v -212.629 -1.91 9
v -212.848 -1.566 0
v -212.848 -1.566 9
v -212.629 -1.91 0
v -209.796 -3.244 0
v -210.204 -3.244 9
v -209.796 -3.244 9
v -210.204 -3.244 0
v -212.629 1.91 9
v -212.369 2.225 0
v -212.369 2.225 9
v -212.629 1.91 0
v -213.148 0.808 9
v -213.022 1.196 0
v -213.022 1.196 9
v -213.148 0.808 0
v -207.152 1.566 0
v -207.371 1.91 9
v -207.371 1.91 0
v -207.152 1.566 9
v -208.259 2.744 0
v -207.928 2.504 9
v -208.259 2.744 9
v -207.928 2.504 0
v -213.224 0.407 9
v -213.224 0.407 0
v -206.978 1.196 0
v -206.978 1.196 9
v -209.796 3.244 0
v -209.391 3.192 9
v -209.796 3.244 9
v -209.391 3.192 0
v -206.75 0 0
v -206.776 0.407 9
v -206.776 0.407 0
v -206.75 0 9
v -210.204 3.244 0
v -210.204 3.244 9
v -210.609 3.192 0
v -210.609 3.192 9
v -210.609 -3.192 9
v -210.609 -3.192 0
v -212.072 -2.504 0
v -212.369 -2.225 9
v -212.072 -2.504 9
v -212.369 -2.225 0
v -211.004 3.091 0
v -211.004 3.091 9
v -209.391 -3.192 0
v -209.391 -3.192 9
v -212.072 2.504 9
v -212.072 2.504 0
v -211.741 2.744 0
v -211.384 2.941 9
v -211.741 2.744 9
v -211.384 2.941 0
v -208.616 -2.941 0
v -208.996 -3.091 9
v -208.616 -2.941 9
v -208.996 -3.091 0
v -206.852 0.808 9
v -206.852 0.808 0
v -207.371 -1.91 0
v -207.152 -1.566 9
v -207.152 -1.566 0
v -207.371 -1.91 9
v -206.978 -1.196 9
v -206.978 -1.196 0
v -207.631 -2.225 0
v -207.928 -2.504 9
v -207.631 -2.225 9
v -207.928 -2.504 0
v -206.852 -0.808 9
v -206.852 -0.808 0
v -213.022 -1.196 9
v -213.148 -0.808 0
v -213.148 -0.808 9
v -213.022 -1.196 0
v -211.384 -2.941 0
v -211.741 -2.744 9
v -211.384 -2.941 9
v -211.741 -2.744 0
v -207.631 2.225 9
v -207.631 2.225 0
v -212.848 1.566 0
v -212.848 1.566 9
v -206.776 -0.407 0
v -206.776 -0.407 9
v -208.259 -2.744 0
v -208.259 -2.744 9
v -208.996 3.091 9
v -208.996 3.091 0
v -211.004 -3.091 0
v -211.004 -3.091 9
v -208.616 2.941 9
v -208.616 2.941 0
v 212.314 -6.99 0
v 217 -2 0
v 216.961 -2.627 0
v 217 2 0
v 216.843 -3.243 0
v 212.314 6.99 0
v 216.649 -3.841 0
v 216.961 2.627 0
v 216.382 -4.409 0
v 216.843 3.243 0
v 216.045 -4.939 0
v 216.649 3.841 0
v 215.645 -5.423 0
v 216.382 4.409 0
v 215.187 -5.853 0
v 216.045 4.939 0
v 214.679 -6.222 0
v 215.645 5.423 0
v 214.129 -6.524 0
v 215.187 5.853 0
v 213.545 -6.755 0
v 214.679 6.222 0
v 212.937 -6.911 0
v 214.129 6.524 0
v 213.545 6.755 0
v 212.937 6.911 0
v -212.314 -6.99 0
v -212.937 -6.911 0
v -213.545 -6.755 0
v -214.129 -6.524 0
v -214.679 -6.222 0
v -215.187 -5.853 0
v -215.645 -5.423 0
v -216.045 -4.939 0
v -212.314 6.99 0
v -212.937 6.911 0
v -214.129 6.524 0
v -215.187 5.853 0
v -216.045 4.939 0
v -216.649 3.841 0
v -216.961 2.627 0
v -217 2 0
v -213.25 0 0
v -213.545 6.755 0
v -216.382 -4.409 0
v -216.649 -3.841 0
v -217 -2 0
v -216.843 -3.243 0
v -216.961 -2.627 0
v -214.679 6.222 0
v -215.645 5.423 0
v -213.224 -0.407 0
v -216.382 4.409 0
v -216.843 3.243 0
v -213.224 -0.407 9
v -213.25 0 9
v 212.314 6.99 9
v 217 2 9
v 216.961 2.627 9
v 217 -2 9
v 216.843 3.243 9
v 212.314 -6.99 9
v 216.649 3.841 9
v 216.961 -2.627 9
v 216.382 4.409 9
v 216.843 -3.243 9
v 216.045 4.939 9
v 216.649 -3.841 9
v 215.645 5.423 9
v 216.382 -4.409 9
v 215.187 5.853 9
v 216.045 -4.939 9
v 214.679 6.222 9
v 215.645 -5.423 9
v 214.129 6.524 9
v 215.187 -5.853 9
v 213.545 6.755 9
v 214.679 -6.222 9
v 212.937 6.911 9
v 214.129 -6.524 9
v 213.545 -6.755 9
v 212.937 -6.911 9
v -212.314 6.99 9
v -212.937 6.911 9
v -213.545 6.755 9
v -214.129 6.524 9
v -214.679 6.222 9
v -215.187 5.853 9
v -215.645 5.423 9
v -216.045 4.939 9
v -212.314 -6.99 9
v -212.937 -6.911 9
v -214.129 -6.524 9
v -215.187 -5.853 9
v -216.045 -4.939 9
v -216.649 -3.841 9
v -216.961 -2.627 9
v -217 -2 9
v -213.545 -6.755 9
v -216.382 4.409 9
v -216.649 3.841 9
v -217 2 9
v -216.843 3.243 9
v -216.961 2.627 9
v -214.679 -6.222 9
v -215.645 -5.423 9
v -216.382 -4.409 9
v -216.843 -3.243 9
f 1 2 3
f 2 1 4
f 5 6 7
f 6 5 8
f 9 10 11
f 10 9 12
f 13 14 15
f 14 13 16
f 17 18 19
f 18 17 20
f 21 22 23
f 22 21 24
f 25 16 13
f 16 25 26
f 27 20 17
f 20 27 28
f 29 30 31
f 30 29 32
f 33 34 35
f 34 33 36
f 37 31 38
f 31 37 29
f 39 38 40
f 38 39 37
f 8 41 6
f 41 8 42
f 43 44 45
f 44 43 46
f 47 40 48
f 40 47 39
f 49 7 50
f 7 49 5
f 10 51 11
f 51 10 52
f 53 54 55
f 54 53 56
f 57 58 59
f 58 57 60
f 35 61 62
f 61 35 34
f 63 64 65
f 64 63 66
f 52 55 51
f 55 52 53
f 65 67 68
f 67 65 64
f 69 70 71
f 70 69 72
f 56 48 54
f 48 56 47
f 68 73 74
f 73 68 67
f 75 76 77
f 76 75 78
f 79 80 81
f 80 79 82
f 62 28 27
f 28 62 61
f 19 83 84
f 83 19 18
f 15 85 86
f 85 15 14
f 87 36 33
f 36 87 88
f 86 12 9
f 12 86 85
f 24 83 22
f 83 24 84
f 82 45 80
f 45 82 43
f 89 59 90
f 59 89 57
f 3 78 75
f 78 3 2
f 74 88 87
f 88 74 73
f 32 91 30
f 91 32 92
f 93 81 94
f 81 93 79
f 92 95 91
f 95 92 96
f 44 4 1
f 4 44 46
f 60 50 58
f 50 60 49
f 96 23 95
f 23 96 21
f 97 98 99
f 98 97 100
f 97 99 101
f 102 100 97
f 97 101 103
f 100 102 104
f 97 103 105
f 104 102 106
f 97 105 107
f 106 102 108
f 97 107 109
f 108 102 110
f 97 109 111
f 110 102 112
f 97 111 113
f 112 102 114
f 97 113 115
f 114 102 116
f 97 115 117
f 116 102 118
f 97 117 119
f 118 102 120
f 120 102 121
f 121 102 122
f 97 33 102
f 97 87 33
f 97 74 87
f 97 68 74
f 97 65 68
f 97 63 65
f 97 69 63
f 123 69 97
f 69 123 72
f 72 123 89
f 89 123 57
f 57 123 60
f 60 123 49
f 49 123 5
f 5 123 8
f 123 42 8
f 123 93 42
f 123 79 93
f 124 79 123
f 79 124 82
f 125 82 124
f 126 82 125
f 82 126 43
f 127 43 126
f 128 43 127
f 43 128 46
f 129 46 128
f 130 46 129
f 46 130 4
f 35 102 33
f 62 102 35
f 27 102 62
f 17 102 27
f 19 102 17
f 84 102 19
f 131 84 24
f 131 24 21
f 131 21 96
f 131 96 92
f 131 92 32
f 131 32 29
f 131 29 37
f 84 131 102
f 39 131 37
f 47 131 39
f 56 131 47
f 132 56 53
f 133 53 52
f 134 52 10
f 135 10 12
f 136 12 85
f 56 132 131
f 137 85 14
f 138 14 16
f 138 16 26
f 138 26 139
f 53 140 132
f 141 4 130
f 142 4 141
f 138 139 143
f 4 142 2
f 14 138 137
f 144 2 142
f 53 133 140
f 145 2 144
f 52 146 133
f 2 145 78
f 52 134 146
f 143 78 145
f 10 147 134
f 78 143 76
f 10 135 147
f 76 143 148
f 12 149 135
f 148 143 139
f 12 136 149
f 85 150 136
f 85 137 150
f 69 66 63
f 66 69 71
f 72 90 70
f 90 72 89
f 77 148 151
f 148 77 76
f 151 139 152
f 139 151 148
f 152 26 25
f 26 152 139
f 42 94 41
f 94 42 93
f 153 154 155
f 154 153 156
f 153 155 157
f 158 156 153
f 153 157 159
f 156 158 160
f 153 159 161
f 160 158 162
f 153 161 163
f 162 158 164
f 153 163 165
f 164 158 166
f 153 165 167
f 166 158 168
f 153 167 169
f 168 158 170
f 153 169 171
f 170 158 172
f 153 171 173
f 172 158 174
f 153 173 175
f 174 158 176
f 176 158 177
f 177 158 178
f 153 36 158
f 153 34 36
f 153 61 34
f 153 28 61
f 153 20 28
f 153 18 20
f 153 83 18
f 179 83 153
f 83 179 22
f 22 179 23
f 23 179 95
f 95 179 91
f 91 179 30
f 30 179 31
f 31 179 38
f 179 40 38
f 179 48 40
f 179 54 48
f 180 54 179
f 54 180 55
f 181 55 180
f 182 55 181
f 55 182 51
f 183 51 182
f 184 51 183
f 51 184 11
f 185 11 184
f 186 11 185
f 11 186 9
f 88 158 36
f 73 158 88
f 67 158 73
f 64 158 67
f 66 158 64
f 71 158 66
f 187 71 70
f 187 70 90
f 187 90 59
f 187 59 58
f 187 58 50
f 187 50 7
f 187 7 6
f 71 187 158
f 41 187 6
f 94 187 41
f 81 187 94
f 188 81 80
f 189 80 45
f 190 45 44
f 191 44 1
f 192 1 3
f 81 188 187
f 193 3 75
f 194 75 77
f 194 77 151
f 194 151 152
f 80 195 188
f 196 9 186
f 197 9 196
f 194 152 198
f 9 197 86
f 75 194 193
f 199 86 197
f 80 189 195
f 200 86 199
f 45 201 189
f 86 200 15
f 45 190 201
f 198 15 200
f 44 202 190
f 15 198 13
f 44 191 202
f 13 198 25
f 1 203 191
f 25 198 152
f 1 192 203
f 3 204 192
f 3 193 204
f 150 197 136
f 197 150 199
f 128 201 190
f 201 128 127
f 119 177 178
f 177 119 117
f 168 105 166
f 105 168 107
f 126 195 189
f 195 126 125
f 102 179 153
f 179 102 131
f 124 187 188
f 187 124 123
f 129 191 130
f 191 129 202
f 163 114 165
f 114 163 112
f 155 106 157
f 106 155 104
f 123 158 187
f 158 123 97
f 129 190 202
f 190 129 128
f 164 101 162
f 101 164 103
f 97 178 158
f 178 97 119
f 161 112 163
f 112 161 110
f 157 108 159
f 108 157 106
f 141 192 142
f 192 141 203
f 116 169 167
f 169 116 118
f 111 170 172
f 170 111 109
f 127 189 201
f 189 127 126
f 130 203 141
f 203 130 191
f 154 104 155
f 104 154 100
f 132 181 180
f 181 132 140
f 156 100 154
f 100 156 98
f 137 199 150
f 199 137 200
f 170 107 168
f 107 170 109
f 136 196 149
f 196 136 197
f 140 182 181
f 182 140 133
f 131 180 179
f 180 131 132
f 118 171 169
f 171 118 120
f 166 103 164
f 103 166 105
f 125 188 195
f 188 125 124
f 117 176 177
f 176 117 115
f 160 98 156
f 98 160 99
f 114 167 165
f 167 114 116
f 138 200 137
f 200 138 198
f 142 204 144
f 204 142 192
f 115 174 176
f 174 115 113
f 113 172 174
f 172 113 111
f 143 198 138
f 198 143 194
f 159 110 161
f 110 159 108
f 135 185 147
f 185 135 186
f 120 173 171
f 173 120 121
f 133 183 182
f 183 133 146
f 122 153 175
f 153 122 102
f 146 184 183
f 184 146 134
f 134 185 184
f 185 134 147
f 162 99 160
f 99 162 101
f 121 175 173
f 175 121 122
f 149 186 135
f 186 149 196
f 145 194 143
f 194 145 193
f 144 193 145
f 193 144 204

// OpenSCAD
$fn = 50;


difference() {
	union() {
		hull() {
			translate(v = [-212.0000000000, 2.0000000000, 0]) {
				cylinder(h = 9, r = 5);
			}
			translate(v = [212.0000000000, 2.0000000000, 0]) {
				cylinder(h = 9, r = 5);
			}
			translate(v = [-212.0000000000, -2.0000000000, 0]) {
				cylinder(h = 9, r = 5);
			}
			translate(v = [212.0000000000, -2.0000000000, 0]) {
				cylinder(h = 9, r = 5);
			}
		}
	}
	union() {
		translate(v = [-210.0000000000, 0.0000000000, 0]) {
			cylinder(h = 9, r = 3.2500000000);
		}
		translate(v = [-210.0000000000, 0.0000000000, 0]) {
			cylinder(h = 9, r = 1.8000000000);
		}
		translate(v = [-210.0000000000, 0.0000000000, 0]) {
			cylinder(h = 9, r = 1.8000000000);
		}
		translate(v = [-210.0000000000, 0.0000000000, 0]) {
			cylinder(h = 9, r = 1.8000000000);
		}
	}
}
